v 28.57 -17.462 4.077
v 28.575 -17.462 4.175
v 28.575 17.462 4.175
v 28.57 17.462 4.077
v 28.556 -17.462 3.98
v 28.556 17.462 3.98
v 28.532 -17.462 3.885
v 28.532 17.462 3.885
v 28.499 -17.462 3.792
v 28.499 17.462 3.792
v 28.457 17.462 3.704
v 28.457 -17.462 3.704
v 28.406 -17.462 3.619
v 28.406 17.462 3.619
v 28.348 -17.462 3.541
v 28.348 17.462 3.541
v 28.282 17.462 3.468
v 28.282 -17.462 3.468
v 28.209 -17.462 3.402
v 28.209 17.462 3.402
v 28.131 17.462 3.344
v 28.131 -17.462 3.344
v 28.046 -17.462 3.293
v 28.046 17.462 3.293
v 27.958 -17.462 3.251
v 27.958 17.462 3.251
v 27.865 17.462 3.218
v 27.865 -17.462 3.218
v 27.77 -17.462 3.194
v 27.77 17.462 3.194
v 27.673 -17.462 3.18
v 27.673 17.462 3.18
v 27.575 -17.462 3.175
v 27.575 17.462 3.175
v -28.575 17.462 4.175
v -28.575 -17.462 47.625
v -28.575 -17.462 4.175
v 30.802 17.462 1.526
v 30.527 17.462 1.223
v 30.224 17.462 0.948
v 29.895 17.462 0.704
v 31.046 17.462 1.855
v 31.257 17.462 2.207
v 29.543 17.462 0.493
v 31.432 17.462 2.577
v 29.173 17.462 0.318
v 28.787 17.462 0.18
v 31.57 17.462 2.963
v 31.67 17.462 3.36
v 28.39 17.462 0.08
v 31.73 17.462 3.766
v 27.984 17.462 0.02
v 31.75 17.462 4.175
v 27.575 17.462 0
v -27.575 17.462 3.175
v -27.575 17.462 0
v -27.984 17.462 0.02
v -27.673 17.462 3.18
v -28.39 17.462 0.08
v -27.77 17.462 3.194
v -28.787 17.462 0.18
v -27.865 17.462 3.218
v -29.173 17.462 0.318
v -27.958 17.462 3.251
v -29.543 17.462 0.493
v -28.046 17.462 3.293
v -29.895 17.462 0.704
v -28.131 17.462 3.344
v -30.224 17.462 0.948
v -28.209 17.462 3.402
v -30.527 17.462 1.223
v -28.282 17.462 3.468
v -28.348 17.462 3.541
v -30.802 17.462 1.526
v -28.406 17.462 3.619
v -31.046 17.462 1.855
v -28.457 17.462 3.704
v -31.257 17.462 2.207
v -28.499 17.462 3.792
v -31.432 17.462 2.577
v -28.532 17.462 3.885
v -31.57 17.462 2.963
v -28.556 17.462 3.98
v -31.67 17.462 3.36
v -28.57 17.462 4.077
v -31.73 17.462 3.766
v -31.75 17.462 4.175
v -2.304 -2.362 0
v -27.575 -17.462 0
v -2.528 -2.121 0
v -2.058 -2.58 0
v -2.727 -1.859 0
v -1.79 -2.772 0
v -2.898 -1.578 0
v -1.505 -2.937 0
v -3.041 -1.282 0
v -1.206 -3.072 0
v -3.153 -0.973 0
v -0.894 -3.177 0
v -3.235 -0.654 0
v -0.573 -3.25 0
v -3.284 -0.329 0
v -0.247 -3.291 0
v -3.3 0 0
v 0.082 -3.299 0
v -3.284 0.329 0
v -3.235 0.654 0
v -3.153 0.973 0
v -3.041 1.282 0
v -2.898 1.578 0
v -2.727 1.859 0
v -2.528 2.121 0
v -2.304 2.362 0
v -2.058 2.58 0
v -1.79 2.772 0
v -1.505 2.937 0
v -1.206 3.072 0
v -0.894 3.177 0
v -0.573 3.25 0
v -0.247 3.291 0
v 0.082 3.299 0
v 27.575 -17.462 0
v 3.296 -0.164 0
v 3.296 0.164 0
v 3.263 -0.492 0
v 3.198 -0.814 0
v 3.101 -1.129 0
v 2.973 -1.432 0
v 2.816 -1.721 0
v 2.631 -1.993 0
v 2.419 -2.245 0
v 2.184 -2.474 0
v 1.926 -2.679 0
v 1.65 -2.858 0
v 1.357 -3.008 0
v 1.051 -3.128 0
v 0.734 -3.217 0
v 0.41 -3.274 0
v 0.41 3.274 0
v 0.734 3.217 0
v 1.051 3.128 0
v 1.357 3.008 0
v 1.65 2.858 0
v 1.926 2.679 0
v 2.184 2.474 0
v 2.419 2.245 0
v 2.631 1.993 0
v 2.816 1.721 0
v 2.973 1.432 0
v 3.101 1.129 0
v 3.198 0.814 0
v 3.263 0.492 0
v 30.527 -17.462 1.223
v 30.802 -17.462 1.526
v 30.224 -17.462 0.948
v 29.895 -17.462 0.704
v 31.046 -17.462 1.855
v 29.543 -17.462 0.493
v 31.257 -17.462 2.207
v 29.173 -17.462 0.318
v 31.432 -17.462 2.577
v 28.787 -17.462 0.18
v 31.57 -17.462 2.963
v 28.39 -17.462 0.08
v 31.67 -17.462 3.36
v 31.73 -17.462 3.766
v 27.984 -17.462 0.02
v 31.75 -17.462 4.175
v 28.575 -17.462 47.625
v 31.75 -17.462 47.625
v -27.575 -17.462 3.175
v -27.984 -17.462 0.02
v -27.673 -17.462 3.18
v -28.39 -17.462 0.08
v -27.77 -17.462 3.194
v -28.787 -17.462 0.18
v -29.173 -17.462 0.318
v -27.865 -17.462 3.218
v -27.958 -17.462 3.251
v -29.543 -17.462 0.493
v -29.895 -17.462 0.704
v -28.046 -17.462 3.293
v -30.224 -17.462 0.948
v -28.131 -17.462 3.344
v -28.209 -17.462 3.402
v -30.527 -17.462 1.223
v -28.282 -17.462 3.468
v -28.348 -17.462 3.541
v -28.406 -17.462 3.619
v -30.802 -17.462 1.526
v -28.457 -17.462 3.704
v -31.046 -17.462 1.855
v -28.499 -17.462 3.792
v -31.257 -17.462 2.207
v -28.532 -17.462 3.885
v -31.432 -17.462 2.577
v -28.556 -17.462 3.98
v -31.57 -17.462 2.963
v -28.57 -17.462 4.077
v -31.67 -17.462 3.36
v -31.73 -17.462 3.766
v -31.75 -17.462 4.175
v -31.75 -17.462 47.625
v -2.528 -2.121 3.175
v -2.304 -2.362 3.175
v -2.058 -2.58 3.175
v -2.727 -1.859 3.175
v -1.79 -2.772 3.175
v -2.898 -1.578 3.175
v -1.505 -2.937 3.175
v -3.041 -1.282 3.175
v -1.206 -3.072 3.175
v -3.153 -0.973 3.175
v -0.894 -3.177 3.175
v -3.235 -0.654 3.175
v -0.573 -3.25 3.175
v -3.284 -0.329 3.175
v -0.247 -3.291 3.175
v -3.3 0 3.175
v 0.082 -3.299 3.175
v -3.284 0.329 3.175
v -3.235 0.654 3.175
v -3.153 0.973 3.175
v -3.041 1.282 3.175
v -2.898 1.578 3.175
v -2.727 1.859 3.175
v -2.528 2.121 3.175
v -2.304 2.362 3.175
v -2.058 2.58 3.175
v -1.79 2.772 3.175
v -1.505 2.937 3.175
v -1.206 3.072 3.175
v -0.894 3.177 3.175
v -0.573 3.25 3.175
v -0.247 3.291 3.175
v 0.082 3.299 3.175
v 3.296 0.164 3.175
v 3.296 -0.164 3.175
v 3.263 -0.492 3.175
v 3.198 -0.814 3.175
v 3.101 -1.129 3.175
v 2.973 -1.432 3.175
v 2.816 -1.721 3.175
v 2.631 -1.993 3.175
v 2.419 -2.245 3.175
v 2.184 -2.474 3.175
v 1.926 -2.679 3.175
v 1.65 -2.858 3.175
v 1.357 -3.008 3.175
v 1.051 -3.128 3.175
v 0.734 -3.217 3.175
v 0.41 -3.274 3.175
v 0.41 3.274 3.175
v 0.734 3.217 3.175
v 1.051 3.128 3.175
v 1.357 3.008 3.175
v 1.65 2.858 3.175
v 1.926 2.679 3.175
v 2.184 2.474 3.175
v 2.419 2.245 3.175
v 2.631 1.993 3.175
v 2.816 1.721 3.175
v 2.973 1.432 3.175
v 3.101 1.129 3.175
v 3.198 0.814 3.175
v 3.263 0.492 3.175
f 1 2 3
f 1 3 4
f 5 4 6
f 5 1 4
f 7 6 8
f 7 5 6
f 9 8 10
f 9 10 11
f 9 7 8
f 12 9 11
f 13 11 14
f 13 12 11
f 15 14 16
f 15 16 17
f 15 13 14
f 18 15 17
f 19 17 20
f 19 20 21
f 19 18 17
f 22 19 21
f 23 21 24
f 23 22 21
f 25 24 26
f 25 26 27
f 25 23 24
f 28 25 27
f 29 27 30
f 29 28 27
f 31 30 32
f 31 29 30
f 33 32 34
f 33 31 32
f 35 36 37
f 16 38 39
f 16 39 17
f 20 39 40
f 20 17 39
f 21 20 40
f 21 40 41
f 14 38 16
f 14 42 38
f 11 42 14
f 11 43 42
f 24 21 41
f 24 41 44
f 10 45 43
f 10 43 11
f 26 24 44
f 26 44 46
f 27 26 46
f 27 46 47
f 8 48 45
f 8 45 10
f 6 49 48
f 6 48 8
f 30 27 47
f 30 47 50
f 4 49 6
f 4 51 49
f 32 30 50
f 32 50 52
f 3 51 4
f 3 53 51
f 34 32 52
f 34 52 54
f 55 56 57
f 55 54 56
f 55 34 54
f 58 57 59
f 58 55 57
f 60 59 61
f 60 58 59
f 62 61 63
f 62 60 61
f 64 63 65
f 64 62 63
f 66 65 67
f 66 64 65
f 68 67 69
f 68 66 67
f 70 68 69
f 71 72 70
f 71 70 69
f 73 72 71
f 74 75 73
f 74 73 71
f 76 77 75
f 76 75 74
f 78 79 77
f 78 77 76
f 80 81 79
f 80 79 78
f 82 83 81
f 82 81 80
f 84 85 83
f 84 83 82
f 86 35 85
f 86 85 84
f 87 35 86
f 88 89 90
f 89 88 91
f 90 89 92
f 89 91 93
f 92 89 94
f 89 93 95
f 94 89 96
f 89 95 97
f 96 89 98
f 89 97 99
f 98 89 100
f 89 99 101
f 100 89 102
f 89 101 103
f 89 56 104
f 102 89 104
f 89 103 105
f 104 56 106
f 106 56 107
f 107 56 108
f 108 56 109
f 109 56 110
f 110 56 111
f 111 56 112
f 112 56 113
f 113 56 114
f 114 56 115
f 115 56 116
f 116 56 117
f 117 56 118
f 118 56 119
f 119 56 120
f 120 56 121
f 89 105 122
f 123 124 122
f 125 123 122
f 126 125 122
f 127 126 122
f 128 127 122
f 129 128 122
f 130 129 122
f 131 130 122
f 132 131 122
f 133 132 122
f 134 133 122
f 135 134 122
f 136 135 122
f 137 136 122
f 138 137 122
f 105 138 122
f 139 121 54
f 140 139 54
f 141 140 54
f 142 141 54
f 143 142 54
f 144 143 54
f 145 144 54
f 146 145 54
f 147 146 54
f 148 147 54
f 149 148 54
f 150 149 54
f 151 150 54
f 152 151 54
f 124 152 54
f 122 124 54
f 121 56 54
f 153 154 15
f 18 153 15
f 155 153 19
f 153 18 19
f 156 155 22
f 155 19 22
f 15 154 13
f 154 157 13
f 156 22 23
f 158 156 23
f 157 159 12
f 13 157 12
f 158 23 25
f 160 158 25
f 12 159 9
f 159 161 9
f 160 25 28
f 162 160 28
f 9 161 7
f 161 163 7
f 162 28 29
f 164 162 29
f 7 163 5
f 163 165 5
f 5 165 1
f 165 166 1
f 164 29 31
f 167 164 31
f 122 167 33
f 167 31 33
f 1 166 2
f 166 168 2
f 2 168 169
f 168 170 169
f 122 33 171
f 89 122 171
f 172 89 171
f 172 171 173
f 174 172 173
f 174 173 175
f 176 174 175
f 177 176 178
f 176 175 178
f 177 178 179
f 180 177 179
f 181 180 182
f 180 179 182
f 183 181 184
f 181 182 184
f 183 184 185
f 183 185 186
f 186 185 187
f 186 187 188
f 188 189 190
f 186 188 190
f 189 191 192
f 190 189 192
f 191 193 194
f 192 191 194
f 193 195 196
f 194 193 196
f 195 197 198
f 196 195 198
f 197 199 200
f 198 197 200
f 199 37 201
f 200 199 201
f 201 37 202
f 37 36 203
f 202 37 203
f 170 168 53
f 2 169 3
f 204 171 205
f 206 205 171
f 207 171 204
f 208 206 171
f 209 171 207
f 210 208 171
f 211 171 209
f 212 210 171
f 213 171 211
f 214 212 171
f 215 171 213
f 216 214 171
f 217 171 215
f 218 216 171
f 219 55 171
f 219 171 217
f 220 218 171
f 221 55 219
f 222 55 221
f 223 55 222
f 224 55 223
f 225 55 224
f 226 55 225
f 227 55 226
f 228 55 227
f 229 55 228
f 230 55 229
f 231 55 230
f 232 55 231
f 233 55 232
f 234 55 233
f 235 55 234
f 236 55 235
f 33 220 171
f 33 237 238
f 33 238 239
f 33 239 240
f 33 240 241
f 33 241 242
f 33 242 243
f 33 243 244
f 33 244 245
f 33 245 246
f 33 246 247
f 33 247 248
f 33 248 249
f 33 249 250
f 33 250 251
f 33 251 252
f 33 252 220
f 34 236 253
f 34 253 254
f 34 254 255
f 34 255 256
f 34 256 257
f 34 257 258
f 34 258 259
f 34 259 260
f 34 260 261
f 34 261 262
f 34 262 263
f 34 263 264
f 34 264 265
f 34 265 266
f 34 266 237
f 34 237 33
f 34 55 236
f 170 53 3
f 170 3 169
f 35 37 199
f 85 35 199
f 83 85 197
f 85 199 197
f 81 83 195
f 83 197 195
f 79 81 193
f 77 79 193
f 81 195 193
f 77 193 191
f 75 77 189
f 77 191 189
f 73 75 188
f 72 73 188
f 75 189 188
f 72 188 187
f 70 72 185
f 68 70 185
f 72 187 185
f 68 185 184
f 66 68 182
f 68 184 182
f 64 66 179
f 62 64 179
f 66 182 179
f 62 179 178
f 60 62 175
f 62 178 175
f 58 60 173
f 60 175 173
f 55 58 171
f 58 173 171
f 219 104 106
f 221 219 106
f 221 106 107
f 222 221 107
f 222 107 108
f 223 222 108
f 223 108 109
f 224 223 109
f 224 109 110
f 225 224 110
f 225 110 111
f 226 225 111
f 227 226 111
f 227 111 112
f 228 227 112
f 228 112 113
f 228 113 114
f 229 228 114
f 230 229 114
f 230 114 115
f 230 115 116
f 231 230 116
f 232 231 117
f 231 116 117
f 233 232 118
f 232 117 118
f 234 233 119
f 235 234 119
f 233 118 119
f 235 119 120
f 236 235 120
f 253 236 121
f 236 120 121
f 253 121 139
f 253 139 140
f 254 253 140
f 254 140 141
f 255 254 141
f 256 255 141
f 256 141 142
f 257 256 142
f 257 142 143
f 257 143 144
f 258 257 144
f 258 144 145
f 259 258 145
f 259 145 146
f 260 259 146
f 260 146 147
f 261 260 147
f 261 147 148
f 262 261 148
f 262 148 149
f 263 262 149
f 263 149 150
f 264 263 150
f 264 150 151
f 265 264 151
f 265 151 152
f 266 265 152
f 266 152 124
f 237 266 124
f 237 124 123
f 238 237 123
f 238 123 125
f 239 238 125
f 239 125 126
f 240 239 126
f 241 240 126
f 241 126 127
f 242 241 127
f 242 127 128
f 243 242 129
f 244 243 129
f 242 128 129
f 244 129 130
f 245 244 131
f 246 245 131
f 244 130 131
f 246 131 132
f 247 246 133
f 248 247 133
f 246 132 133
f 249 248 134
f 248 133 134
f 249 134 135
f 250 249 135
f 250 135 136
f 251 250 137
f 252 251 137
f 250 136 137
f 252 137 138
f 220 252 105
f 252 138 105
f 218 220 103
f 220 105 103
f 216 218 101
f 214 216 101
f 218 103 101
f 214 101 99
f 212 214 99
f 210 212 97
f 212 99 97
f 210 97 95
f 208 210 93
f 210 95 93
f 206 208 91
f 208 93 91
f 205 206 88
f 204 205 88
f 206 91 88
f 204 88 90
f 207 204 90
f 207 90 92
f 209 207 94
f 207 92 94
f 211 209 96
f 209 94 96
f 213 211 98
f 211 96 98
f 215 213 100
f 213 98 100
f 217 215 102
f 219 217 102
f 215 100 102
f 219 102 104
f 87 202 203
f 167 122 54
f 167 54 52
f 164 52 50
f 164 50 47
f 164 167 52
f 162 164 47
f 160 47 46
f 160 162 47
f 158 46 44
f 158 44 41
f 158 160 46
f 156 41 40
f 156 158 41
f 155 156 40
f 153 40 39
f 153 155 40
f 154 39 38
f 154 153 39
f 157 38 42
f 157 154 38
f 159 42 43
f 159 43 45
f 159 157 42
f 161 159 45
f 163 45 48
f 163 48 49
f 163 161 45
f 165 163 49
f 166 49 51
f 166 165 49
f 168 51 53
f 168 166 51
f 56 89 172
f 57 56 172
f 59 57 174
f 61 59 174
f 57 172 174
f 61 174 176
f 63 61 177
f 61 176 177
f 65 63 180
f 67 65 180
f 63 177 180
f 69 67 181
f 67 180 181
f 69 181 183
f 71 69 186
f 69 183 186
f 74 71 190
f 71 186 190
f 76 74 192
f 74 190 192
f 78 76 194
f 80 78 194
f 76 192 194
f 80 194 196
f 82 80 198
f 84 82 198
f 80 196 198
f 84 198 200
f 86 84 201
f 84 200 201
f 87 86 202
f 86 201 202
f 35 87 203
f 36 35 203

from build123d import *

# Parameters (mm, degrees)
SKETCH2_W                    = 57.15
SKETCH2_H                    = 34.925
BASE_FLANGE1_DEPTH           = 3.175
EDGE_FLANGE1_STRIP_W         = 14.7
EDGE_FLANGE1_STRIP_H         = 3.175
EDGE_FLANGE1_STRIP_CUT_DEPTH = 34.925
EDGE_FLANGE1_DEPTH           = 34.925
CUT_EXTRUDE1_DEPTH           = 3.175
M6_CLEARANCE_HOLE1_D         = 6.6


# Sheet-metal steps are written as plain solids
with BuildPart() as part:
    # Sketch2 → Base-Flange1 (new body)
    with BuildSketch(Plane.XY):
        Rectangle(SKETCH2_W, SKETCH2_H)
    extrude(amount=BASE_FLANGE1_DEPTH)

    # Edge-Flange1 strip (across the edge) → Edge-Flange1 strip cut (cut)
    with BuildSketch(Plane(origin=(28.575, -17.4625, 3.175), x_dir=(-1, 0, 0), z_dir=(0, 1, 0))):
        with Locations((-6.35, -1.5875)):
            Rectangle(EDGE_FLANGE1_STRIP_W, EDGE_FLANGE1_STRIP_H)
    edge_flange1_strip_cut = extrude(amount=EDGE_FLANGE1_STRIP_CUT_DEPTH, mode=Mode.SUBTRACT)

    # Edge-Flange1 section (across the edge) → Edge-Flange1 (add)
    with BuildSketch(Plane(origin=(28.575, -17.4625, 3.175), x_dir=(-1, 0, 0), z_dir=(0, 1, 0))):
        with BuildLine():
            Line((-3.175, 1), (-3.175, 44.45))
            Line((-3.175, 44.45), (0, 44.45))
            Line((0, 44.45), (0, 1))
            ThreePointArc((0, 1), (0.292893219, 0.292893219), (1, 0))
            Line((1, 0), (1, -3.175))
            ThreePointArc((1, -3.175), (-1.952170811, -1.952170811), (-3.175, 1))
        make_face()
    edge_flange1 = extrude(amount=EDGE_FLANGE1_DEPTH)

    # Sketch10 → Cut-Extrude1 (cut)
    with BuildSketch(Plane(origin=(31.75, 0, 0), x_dir=(0, 0, -1), z_dir=(1, 0, 0))):
        Polygon((-4.175, 17.4625), (-47.625, -17.4625), (-47.625, 17.4625), align=None)
    cut_extrude1 = extrude(amount=-CUT_EXTRUDE1_DEPTH, mode=Mode.SUBTRACT)

    # Mirror1: Edge-Flange1 strip cut, Edge-Flange1, Cut-Extrude1 across plane
    add(edge_flange1_strip_cut.mirror(Plane(origin=(0, 0, 0), x_dir=(0, 0, 1), z_dir=(1, 0, 0))), mode=Mode.SUBTRACT)
    add(edge_flange1.mirror(Plane(origin=(0, 0, 0), x_dir=(0, 0, 1), z_dir=(1, 0, 0))))
    add(cut_extrude1.mirror(Plane(origin=(0, 0, 0), x_dir=(0, 0, 1), z_dir=(1, 0, 0))), mode=Mode.SUBTRACT)

    # M6 Clearance Hole1 (through all)
    with Locations(Plane.XY.offset(3.175)):
        with Locations((0, 0)):
            Hole(M6_CLEARANCE_HOLE1_D / 2)


solid = part.part
